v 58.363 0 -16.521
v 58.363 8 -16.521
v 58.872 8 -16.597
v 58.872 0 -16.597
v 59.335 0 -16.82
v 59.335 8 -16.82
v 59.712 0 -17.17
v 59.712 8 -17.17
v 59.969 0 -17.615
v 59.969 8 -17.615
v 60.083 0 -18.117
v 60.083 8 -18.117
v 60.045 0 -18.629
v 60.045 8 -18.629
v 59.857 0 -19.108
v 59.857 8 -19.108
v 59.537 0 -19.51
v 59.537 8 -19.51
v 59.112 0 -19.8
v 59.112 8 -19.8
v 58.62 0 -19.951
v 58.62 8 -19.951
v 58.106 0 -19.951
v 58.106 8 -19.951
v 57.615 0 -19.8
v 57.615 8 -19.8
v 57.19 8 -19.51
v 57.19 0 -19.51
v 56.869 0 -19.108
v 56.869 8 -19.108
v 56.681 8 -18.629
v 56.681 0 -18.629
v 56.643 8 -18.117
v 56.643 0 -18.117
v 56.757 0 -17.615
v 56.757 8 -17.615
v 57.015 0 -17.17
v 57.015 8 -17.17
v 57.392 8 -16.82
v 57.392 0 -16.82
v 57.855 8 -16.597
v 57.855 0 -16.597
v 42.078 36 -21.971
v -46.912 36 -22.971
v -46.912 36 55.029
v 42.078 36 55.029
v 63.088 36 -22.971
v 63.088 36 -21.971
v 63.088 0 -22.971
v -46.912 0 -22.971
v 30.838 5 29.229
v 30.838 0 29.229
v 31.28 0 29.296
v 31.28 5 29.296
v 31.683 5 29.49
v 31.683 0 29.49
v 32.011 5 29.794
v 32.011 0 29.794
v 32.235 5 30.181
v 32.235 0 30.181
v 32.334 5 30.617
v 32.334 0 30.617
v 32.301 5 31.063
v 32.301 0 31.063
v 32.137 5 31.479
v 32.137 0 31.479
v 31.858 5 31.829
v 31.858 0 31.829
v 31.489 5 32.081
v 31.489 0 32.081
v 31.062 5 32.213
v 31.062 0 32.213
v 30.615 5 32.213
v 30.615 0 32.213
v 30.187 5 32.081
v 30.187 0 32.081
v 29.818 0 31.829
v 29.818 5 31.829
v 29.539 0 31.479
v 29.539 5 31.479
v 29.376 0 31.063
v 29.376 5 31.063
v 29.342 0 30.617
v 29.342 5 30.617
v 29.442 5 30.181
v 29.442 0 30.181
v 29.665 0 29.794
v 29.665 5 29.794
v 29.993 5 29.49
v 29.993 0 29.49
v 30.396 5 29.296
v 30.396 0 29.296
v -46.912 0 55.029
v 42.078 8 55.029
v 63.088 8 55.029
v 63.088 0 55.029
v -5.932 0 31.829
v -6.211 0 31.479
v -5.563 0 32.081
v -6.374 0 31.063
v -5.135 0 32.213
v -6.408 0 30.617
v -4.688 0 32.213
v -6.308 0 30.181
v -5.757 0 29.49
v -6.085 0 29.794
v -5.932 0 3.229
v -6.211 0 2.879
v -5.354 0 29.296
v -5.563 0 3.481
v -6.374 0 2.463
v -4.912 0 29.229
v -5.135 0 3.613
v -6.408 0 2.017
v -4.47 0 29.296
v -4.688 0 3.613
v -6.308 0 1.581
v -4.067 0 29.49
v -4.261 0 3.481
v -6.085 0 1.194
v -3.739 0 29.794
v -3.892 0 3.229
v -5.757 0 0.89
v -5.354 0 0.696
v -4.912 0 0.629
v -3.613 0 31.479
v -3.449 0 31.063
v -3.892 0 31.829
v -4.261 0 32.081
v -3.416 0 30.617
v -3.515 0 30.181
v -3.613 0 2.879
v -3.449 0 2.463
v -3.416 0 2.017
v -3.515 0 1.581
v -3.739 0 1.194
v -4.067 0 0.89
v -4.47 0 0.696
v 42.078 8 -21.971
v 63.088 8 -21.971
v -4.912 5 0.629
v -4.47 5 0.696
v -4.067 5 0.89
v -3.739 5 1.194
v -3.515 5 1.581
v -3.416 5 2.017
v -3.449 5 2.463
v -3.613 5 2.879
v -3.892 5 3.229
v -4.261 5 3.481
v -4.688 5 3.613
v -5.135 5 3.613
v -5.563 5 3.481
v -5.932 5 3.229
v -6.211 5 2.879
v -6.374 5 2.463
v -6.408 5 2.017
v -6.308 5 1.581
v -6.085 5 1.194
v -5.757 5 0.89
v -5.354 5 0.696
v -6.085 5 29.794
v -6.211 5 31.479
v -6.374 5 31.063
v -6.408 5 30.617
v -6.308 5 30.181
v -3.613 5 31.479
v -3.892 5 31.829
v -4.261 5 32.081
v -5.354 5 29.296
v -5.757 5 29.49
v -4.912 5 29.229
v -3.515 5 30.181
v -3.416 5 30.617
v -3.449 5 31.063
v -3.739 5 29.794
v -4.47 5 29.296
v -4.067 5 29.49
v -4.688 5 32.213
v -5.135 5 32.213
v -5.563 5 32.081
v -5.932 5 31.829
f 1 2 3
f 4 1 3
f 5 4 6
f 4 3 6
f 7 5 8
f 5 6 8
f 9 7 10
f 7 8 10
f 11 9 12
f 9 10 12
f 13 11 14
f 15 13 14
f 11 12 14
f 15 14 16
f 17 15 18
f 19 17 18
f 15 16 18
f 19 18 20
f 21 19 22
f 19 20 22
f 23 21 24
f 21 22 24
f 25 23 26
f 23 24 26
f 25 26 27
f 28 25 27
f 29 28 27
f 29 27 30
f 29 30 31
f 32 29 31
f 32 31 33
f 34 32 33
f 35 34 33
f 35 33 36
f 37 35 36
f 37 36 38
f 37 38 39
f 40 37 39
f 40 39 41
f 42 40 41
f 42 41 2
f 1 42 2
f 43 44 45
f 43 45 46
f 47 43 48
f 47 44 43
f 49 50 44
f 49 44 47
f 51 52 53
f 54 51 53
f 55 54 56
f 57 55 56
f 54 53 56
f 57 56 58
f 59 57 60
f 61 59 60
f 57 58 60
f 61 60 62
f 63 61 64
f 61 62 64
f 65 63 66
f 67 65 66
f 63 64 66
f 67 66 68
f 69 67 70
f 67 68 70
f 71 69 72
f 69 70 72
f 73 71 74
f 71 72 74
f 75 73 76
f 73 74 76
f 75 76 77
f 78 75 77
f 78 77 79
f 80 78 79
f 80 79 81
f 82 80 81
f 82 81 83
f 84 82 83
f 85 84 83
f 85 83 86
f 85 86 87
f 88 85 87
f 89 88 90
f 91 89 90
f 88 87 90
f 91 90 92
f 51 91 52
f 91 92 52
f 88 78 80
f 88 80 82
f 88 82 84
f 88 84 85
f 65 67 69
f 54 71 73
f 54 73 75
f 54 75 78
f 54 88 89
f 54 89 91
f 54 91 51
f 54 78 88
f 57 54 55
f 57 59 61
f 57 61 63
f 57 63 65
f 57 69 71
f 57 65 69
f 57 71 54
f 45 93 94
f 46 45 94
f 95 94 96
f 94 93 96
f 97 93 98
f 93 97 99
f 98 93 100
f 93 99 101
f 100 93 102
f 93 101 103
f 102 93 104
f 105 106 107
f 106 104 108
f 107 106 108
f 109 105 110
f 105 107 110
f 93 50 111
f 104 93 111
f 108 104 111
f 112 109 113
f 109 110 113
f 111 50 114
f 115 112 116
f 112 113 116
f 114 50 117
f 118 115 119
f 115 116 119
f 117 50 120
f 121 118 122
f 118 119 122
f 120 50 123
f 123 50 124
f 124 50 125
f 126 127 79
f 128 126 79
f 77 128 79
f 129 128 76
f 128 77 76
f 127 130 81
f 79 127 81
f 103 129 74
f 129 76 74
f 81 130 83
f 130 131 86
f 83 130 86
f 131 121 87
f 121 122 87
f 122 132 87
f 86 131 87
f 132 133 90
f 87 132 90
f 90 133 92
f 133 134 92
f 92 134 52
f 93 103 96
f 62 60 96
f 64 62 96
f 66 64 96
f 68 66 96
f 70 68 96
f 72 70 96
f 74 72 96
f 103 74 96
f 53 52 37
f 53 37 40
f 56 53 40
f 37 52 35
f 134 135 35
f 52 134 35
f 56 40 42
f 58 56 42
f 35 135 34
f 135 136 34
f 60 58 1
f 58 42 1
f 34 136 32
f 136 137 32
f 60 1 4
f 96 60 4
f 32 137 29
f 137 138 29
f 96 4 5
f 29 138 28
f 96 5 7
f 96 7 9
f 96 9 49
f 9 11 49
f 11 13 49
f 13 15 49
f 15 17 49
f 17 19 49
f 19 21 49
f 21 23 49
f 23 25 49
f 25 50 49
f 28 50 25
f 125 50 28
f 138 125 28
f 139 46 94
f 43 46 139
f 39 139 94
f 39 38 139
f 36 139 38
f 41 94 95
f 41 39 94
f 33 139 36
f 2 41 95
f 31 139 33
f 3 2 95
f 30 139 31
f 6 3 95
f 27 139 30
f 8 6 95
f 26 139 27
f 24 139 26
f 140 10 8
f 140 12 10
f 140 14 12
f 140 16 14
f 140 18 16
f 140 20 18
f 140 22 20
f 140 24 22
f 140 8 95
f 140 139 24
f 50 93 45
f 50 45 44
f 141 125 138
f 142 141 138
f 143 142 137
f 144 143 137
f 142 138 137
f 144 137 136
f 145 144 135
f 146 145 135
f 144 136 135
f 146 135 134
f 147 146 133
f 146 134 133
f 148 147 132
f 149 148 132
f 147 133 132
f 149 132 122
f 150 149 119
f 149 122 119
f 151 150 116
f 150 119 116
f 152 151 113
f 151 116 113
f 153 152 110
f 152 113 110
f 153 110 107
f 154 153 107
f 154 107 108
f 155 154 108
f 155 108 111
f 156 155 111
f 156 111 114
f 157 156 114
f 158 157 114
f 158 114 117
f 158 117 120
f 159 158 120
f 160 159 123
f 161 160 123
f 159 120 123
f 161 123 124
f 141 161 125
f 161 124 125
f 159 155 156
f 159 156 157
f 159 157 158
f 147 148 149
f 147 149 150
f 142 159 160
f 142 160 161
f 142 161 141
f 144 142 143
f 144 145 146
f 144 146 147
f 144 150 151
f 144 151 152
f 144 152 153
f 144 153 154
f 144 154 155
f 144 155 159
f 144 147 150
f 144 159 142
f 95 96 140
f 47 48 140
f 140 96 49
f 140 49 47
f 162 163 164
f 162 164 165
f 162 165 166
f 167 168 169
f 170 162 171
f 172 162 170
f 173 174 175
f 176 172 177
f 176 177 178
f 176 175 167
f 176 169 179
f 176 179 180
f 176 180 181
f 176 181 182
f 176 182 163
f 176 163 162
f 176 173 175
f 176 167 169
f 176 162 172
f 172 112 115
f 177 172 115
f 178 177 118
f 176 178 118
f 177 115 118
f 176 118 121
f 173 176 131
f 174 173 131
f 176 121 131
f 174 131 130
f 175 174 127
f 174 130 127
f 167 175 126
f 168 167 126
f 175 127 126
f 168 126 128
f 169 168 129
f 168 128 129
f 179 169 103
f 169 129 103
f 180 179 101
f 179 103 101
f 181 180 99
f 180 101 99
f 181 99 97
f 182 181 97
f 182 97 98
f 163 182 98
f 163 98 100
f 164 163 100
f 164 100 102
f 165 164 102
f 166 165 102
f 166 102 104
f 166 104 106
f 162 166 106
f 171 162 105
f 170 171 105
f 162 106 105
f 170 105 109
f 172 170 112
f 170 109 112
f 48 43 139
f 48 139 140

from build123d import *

# Parameters (mm, degrees)
SKETCH1_W           = 110
SKETCH1_H           = 78
BOSS_EXTRUDE1_DEPTH = 36
SKETCH2_W           = 21.010174998
SKETCH2_H           = 77
CUT_EXTRUDE1_DEPTH  = 28
SKETCH3_R           = 1.725
CUT_EXTRUDE2_DEPTH  = 89.2743541
SKETCH4_R           = 1.5
CUT_EXTRUDE3_DEPTH  = 5


with BuildPart() as part:
    # Sketch1 → Boss-Extrude1 (new body)
    with BuildSketch(Plane(origin=(0, 0, 0), x_dir=(1, 0, 0), z_dir=(0, 1, 0))):
        with Locations((8.088235294, -16.029411765)):
            Rectangle(SKETCH1_W, SKETCH1_H)
    extrude(amount=BOSS_EXTRUDE1_DEPTH)

    # Sketch2 → Cut-Extrude1 (cut)
    with BuildSketch(Plane(origin=(0, 36, 0), x_dir=(1, 0, 0), z_dir=(0, 1, 0))):
        with Locations((52.583147795, -16.529411765)):
            Rectangle(SKETCH2_W, SKETCH2_H)
    extrude(amount=-CUT_EXTRUDE1_DEPTH, mode=Mode.SUBTRACT)

    # Sketch3 → Cut-Extrude2 (cut, through all)
    with BuildSketch(Plane(origin=(0, 8, 0), x_dir=(1, 0, 0), z_dir=(0, 1, 0))):
        with Locations(Location((58.363235294, 18.245588235, 0), (0, 0, 270))):
            Circle(SKETCH3_R)
    extrude(amount=-CUT_EXTRUDE2_DEPTH, mode=Mode.SUBTRACT)

    # Sketch4 → Cut-Extrude3 (cut)
    with BuildSketch(Plane.XZ):
        with Locations(Location((-4.911764706, 2.129411765, 0), (0, 0, 270))):
            Circle(SKETCH4_R)
        with Locations(Location((-4.911764706, 30.729411765, 0), (0, 0, 270))):
            Circle(SKETCH4_R)
        with Locations(Location((30.838235294, 30.729411765, 0), (0, 0, 270))):
            Circle(SKETCH4_R)
    extrude(amount=-CUT_EXTRUDE3_DEPTH, mode=Mode.SUBTRACT)


solid = part.part
